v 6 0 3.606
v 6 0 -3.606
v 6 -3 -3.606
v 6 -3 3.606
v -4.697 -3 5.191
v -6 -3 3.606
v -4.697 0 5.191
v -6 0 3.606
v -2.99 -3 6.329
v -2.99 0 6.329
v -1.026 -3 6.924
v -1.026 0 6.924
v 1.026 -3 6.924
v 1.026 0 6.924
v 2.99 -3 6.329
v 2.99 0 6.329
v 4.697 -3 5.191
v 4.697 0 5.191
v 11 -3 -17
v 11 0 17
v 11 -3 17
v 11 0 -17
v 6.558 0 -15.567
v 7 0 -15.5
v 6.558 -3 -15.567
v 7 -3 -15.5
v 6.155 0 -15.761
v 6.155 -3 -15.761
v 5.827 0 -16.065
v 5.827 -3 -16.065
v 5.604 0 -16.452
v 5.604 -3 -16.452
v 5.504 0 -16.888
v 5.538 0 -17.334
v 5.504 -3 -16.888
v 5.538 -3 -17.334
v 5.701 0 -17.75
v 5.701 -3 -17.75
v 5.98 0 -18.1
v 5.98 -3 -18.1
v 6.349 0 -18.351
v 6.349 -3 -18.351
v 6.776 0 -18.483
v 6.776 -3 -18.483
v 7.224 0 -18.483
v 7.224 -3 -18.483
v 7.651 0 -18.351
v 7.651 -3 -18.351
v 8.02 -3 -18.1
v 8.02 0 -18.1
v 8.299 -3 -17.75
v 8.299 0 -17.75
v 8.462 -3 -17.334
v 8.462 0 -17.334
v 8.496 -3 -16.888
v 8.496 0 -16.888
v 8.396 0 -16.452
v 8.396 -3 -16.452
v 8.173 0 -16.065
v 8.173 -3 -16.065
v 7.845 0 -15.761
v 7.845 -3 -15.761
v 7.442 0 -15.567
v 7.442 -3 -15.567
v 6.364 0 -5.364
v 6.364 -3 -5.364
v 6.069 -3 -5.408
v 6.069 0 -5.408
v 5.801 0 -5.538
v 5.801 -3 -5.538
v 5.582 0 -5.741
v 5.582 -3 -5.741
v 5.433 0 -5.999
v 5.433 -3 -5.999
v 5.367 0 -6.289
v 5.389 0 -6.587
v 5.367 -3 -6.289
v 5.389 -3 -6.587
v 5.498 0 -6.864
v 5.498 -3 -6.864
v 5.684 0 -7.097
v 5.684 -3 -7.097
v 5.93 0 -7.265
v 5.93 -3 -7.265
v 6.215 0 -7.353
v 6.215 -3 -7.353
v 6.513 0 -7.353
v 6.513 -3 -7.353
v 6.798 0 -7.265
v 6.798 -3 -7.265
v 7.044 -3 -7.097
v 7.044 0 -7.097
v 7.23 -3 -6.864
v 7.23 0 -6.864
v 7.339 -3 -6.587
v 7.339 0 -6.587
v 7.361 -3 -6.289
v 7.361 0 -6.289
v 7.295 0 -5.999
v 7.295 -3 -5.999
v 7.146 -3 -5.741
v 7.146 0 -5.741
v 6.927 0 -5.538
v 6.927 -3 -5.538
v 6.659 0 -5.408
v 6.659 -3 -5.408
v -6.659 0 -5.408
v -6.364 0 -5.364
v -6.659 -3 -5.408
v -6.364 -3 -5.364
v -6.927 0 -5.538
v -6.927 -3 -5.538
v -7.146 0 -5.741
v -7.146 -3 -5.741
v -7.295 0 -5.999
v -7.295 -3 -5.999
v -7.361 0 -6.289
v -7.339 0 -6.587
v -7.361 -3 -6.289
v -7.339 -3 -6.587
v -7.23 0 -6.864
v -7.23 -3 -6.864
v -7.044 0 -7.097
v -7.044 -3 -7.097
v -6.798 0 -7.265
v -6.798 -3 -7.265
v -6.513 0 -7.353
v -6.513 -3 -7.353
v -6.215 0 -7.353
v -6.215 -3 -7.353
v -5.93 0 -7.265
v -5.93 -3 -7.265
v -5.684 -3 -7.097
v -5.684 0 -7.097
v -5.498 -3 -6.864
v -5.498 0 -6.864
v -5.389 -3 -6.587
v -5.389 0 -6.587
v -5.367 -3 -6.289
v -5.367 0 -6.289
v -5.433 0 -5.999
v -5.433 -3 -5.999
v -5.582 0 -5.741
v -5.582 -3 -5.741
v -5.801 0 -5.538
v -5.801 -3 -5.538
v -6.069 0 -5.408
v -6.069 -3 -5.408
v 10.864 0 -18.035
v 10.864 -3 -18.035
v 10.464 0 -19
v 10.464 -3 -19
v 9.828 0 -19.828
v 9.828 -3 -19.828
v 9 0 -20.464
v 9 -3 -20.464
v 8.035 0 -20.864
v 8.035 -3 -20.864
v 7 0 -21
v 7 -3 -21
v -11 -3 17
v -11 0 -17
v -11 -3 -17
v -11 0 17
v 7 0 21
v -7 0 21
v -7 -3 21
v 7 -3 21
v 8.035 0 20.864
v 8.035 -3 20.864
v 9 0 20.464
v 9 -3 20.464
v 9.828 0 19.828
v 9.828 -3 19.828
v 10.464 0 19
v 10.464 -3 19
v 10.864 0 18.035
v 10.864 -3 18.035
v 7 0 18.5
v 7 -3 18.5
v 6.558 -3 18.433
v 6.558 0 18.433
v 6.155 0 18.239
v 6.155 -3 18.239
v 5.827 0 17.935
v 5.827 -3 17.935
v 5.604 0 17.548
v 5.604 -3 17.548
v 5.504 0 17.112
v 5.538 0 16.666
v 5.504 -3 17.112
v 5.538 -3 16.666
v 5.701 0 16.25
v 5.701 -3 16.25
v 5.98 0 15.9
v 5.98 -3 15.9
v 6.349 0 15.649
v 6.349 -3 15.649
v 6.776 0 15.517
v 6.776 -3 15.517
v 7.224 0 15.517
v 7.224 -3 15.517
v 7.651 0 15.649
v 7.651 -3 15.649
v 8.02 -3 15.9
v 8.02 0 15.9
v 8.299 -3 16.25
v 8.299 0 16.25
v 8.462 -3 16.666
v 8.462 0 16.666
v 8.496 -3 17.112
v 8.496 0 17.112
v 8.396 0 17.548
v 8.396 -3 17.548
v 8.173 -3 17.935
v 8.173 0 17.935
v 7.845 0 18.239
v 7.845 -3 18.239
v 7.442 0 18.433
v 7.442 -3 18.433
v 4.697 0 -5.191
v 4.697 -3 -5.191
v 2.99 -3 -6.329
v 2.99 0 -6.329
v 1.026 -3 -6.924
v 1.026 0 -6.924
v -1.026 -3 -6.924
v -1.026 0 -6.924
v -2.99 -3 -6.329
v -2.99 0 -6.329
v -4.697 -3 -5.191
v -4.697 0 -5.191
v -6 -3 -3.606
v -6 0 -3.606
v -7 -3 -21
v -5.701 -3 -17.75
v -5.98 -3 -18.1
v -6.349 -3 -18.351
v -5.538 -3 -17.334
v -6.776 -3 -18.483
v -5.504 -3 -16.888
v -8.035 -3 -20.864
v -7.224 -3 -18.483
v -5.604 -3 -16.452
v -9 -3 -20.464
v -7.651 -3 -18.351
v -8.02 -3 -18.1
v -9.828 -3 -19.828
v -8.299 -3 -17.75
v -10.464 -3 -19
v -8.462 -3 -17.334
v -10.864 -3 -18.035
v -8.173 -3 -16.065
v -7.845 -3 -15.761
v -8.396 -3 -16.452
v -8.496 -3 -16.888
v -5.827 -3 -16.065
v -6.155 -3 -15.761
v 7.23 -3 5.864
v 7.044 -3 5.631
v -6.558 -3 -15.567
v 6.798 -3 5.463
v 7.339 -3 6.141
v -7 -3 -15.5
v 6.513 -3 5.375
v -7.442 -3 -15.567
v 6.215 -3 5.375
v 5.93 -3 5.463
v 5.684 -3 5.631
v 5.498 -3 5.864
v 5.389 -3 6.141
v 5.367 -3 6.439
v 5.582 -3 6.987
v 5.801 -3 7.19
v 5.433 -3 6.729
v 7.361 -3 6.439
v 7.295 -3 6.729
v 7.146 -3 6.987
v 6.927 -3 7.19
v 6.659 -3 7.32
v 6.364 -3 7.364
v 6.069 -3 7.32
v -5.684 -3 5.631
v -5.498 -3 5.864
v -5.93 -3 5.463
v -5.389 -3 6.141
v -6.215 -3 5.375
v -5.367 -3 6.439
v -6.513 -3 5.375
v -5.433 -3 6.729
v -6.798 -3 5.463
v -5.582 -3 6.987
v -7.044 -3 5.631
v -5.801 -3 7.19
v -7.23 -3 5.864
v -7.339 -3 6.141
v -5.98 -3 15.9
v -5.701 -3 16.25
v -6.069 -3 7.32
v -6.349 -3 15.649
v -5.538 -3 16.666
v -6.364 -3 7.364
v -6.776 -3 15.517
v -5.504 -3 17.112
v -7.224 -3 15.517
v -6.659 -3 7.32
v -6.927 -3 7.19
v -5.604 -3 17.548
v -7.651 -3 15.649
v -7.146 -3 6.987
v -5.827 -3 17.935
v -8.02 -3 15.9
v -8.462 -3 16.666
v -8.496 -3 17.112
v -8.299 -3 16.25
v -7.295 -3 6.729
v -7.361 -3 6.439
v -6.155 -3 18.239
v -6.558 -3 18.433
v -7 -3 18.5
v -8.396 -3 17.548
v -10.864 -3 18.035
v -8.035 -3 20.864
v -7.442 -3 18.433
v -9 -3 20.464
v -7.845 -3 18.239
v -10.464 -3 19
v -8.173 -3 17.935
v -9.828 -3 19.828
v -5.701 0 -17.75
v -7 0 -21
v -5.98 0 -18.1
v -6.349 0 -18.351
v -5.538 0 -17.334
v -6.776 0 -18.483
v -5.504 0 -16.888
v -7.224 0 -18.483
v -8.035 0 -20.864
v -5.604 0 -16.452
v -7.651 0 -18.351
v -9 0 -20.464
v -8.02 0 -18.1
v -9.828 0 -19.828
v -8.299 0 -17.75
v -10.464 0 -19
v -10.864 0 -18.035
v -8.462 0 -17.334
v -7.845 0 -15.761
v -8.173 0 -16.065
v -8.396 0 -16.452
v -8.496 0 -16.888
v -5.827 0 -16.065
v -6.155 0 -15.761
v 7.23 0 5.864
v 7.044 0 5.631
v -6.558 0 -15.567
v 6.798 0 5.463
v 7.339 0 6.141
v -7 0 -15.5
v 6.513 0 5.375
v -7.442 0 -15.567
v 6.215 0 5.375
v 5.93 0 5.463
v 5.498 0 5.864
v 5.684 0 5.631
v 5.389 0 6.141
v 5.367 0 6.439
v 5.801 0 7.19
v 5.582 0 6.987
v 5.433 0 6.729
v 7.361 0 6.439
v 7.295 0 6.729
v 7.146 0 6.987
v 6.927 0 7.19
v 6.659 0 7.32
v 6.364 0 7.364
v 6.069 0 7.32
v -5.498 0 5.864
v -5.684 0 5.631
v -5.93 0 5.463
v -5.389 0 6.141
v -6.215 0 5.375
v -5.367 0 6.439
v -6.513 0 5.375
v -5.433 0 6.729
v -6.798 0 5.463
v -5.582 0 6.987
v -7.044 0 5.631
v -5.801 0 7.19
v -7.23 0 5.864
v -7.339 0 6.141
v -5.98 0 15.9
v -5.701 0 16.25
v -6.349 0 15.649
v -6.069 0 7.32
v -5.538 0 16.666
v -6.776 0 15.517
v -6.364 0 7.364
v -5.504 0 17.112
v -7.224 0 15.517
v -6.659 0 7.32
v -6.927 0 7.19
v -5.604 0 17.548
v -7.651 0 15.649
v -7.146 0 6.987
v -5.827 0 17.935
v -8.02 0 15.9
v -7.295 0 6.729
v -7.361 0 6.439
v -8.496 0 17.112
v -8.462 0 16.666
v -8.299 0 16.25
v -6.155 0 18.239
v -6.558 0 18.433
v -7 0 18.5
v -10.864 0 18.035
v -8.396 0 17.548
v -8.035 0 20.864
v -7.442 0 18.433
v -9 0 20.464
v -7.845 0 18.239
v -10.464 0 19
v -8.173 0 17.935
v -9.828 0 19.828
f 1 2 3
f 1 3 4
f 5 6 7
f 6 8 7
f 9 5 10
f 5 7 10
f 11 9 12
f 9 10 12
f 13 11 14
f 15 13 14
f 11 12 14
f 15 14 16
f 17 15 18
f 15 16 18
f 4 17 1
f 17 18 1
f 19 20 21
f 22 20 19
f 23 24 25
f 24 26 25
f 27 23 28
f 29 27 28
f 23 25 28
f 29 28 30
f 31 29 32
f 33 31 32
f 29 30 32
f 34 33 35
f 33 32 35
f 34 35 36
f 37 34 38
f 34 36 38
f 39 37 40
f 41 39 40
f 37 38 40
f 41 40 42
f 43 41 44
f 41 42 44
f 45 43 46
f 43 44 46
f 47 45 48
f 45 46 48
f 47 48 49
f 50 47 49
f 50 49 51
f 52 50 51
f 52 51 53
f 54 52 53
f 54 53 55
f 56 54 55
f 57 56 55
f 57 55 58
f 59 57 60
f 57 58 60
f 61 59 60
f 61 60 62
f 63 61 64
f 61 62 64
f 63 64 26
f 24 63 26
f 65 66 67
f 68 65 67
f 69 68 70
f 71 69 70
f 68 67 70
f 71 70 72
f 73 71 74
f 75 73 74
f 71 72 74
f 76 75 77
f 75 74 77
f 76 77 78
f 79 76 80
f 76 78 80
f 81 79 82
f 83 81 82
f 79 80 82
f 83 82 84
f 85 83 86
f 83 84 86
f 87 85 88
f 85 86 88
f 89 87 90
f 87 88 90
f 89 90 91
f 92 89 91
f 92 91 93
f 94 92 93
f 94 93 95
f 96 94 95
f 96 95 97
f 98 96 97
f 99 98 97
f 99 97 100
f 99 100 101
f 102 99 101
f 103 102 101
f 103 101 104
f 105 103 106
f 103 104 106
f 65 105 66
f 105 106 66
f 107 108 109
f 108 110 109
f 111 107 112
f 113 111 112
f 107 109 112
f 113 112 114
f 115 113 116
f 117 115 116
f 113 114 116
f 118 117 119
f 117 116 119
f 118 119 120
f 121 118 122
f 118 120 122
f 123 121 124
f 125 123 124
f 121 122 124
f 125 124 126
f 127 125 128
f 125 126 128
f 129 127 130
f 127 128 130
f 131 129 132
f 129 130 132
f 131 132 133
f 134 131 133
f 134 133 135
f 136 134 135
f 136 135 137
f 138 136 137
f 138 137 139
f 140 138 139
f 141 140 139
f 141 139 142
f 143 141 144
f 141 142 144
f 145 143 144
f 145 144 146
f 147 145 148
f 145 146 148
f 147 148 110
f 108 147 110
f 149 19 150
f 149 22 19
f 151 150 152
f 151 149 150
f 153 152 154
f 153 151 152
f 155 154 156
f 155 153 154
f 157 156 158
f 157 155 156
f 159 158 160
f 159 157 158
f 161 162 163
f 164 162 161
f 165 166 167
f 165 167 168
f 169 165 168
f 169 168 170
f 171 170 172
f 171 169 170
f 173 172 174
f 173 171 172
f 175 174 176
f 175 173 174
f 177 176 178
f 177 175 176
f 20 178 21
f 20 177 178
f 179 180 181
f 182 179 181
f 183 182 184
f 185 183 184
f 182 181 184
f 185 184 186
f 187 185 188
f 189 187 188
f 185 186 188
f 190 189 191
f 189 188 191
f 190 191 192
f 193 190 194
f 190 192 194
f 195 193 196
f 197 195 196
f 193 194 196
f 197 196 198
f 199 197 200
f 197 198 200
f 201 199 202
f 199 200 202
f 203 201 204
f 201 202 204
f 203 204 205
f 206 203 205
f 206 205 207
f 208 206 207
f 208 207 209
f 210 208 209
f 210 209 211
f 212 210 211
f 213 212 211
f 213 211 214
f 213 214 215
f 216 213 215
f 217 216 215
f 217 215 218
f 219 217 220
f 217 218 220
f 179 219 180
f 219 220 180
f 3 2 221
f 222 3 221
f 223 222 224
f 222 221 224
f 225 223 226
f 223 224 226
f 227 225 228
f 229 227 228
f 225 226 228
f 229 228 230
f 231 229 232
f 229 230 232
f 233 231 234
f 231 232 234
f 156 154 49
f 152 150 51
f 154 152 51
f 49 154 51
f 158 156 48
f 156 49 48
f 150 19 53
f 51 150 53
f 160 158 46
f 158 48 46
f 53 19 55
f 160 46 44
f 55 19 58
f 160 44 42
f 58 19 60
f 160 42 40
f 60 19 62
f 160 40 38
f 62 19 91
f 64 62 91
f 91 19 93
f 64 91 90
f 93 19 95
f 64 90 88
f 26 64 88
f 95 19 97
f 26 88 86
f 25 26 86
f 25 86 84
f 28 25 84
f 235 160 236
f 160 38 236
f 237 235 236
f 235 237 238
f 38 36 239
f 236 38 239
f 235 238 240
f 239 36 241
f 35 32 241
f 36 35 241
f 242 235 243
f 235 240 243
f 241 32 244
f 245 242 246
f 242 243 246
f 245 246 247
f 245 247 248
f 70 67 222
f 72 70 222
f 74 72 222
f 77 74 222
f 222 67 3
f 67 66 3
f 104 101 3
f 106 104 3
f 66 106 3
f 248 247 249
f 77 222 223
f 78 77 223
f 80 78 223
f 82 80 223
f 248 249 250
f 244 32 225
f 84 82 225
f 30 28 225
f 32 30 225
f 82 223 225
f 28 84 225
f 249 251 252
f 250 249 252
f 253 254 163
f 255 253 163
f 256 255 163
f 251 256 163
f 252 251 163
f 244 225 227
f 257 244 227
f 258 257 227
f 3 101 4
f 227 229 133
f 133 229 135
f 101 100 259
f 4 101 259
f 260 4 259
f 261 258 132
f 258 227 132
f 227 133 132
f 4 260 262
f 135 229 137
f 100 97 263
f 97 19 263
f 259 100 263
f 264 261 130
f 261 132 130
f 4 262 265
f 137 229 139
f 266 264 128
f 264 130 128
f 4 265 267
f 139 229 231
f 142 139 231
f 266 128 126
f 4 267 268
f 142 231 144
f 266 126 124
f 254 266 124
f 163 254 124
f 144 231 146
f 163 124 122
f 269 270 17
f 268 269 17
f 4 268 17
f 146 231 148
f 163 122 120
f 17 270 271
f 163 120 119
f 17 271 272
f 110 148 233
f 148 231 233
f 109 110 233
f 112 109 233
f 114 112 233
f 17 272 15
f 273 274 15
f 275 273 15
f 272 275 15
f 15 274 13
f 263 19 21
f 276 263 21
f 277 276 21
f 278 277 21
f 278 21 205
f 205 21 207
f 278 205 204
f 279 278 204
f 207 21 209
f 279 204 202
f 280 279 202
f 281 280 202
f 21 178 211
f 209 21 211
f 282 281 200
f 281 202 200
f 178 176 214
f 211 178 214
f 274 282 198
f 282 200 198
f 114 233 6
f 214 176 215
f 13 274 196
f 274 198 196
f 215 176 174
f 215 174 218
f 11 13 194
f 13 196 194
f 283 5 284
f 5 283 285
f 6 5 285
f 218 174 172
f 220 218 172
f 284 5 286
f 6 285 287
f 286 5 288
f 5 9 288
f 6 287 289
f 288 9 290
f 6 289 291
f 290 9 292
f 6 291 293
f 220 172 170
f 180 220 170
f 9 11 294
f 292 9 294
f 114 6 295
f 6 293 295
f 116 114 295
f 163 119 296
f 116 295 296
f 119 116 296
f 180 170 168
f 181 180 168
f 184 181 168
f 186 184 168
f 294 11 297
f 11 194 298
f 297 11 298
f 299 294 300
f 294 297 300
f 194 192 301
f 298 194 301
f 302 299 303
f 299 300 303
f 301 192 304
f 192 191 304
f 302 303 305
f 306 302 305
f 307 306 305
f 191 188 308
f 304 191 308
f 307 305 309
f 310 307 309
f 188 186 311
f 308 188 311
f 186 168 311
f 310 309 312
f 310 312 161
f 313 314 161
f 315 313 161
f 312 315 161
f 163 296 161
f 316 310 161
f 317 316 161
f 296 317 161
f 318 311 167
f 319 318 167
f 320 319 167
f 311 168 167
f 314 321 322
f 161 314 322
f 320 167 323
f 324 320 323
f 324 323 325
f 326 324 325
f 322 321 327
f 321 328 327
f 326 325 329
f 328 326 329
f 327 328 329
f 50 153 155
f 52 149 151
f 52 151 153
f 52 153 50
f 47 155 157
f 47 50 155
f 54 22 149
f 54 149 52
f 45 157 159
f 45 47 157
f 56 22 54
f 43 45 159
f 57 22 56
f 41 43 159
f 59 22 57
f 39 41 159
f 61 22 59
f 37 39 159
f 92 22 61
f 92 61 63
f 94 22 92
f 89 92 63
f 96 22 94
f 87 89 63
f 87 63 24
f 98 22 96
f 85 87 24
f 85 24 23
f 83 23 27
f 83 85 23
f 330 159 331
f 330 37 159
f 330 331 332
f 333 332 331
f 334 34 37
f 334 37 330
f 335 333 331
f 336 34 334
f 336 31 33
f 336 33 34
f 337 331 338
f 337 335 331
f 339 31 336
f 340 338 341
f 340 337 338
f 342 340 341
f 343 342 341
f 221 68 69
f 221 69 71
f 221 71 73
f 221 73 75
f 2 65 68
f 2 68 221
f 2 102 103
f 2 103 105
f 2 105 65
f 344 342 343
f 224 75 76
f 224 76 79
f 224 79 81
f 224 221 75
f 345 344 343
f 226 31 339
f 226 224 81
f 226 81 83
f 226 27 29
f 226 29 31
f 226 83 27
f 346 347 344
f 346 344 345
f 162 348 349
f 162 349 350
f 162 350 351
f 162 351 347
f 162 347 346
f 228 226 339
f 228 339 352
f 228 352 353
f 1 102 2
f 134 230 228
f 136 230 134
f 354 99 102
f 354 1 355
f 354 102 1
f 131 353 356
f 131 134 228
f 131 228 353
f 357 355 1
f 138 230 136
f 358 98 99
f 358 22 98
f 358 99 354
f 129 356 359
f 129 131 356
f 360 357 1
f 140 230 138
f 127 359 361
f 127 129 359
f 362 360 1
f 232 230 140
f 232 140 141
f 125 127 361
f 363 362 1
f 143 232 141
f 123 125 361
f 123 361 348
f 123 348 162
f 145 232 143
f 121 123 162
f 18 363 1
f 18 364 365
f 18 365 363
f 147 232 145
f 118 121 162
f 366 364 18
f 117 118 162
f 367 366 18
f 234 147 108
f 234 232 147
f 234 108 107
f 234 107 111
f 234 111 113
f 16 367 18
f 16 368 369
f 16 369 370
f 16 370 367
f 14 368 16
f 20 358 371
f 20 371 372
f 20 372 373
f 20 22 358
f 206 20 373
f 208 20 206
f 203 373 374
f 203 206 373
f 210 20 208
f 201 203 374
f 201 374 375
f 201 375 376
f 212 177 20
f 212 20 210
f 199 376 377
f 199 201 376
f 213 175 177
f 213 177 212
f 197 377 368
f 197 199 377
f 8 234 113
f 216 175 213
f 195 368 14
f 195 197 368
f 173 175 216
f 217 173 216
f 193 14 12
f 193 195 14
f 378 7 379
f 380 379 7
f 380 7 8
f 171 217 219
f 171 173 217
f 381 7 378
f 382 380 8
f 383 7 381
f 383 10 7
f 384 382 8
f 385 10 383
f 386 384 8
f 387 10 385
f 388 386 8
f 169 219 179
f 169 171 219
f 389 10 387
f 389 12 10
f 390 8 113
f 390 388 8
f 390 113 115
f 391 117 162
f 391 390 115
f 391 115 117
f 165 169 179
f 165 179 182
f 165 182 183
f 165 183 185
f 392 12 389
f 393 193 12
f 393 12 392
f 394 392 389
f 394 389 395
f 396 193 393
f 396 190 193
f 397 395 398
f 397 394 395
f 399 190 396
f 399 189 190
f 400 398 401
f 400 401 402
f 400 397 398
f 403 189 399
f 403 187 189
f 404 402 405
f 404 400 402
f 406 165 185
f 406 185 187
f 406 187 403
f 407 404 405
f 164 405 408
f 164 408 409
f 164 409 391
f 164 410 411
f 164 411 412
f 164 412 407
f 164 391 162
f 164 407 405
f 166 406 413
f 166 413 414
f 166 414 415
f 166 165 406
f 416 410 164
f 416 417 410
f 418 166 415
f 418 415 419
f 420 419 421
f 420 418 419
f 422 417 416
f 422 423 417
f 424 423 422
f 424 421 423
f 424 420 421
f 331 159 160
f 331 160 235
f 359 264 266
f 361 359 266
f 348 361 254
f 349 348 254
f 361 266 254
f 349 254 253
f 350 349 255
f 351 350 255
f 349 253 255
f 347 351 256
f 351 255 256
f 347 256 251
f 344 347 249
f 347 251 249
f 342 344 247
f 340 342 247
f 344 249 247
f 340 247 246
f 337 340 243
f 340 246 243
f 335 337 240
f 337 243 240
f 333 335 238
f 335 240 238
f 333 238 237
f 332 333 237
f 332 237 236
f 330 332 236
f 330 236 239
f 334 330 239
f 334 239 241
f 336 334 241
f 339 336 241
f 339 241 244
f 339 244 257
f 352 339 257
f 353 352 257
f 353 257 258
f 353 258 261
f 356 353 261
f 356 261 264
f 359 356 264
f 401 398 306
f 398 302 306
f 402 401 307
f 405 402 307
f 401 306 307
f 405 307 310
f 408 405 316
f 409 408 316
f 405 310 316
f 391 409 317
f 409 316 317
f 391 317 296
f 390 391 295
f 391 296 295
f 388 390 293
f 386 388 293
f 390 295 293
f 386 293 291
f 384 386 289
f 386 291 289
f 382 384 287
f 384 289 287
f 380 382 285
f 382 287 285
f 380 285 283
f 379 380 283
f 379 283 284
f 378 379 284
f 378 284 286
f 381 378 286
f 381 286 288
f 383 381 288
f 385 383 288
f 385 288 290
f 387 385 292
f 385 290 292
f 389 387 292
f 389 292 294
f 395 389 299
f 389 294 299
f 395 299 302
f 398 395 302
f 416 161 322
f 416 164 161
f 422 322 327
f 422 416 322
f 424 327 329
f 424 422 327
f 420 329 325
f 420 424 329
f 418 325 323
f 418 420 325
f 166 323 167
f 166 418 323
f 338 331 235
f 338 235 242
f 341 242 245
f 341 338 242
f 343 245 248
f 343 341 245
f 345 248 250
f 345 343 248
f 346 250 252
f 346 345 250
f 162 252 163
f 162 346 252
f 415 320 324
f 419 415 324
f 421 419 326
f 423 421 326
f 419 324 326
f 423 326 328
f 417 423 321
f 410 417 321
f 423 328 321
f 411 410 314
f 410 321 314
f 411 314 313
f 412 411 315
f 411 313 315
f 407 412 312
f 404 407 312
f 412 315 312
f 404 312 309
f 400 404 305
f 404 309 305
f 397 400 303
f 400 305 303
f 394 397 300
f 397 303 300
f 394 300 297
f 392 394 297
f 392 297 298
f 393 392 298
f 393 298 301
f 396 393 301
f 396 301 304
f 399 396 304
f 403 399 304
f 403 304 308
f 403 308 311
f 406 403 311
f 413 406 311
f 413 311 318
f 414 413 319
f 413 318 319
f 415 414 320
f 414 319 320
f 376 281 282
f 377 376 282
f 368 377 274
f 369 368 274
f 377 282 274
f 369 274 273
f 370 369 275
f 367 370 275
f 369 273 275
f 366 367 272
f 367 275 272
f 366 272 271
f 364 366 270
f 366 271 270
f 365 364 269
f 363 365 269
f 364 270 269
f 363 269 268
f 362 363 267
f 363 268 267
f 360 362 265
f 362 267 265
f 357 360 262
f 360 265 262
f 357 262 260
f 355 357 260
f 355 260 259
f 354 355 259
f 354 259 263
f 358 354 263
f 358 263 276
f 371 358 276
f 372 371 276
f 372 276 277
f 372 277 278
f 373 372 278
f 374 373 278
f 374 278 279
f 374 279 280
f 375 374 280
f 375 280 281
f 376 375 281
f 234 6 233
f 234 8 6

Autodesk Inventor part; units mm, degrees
ref_plane "YZ Plane" through (0, 0, 0) normal (1, 0, 0) x (0, 1, 0)
ref_plane "XZ Plane" through (0, 0, 0) normal (0, 1, 0) x (-1, 0, 0)
ref_plane "XY Plane" through (0, 0, 0) normal (0, 0, 1) x (1, 0, 0)
sketch "Sketch1" plane through (0, 0, 0) normal (0, 1, 0) x (-1, 0, 0)
  line L0 (7, 21) -> (-7, 21)
  line L1 (-11, 17) -> (-11, -17)
  line L2 (-7, -21) -> (7, -21)
  line L3 (11, -17) -> (11, 17)
  line L4 (6, 3.6056) -> (6, -3.6056)
  line L5 (-6, -3.6056) -> (-6, 3.6056)
  line L6 (6.364, 6.364) -> (-6.364, 6.364) construction
  line L7 (-6.364, 6.364) -> (-6.364, -6.364) construction
  line L8 (-6.364, -6.364) -> (6.364, -6.364) construction
  line L9 (6.364, -6.364) -> (6.364, 6.364) construction
  arc A0 (-6, -3.6056) -> (6, -3.6056) centre (0, 0) ccw
  arc A1 (6, 3.6056) -> (-6, 3.6056) centre (0, 0) ccw
  arc A2 (-11, -17) -> (-7, -21) centre (-7, -17) ccw
  arc A3 (-7, 21) -> (-11, 17) centre (-7, 17) ccw
  arc A4 (11, 17) -> (7, 21) centre (7, 17) ccw
  arc A5 (7, -21) -> (11, -17) centre (7, -17) ccw
  point P0 (0, -21)
  point P1 (0, -7)
  point P2 (6.364, 0)
  point P3 (11, 0)
  point P4 (6, 0)
  point P5 (0, -6.364)
  dimension "d0" = 7
  dimension "d1" = 12
  dimension "d2" = 18
  dimension "d3" = 22
  dimension "d4" = 42
  dimension "d5" = 4
extrude "Extrusion1" add sketch "Sketch1" against normal blind 3
hole "Hole1" at (-7, 0, 17) at (7, 0, 17) at (7, 0, -17) at (-7, 0, -17) direction (0, -1, 0) diameter 3 end through all
hole "Hole2" at (-6.364, 0, -6.364) at (6.364, 0, -6.364) at (6.364, 0, 6.364) at (-6.364, 0, 6.364) direction (0, -1, 0) diameter 2 end through all
properties part number "motor_plate"
